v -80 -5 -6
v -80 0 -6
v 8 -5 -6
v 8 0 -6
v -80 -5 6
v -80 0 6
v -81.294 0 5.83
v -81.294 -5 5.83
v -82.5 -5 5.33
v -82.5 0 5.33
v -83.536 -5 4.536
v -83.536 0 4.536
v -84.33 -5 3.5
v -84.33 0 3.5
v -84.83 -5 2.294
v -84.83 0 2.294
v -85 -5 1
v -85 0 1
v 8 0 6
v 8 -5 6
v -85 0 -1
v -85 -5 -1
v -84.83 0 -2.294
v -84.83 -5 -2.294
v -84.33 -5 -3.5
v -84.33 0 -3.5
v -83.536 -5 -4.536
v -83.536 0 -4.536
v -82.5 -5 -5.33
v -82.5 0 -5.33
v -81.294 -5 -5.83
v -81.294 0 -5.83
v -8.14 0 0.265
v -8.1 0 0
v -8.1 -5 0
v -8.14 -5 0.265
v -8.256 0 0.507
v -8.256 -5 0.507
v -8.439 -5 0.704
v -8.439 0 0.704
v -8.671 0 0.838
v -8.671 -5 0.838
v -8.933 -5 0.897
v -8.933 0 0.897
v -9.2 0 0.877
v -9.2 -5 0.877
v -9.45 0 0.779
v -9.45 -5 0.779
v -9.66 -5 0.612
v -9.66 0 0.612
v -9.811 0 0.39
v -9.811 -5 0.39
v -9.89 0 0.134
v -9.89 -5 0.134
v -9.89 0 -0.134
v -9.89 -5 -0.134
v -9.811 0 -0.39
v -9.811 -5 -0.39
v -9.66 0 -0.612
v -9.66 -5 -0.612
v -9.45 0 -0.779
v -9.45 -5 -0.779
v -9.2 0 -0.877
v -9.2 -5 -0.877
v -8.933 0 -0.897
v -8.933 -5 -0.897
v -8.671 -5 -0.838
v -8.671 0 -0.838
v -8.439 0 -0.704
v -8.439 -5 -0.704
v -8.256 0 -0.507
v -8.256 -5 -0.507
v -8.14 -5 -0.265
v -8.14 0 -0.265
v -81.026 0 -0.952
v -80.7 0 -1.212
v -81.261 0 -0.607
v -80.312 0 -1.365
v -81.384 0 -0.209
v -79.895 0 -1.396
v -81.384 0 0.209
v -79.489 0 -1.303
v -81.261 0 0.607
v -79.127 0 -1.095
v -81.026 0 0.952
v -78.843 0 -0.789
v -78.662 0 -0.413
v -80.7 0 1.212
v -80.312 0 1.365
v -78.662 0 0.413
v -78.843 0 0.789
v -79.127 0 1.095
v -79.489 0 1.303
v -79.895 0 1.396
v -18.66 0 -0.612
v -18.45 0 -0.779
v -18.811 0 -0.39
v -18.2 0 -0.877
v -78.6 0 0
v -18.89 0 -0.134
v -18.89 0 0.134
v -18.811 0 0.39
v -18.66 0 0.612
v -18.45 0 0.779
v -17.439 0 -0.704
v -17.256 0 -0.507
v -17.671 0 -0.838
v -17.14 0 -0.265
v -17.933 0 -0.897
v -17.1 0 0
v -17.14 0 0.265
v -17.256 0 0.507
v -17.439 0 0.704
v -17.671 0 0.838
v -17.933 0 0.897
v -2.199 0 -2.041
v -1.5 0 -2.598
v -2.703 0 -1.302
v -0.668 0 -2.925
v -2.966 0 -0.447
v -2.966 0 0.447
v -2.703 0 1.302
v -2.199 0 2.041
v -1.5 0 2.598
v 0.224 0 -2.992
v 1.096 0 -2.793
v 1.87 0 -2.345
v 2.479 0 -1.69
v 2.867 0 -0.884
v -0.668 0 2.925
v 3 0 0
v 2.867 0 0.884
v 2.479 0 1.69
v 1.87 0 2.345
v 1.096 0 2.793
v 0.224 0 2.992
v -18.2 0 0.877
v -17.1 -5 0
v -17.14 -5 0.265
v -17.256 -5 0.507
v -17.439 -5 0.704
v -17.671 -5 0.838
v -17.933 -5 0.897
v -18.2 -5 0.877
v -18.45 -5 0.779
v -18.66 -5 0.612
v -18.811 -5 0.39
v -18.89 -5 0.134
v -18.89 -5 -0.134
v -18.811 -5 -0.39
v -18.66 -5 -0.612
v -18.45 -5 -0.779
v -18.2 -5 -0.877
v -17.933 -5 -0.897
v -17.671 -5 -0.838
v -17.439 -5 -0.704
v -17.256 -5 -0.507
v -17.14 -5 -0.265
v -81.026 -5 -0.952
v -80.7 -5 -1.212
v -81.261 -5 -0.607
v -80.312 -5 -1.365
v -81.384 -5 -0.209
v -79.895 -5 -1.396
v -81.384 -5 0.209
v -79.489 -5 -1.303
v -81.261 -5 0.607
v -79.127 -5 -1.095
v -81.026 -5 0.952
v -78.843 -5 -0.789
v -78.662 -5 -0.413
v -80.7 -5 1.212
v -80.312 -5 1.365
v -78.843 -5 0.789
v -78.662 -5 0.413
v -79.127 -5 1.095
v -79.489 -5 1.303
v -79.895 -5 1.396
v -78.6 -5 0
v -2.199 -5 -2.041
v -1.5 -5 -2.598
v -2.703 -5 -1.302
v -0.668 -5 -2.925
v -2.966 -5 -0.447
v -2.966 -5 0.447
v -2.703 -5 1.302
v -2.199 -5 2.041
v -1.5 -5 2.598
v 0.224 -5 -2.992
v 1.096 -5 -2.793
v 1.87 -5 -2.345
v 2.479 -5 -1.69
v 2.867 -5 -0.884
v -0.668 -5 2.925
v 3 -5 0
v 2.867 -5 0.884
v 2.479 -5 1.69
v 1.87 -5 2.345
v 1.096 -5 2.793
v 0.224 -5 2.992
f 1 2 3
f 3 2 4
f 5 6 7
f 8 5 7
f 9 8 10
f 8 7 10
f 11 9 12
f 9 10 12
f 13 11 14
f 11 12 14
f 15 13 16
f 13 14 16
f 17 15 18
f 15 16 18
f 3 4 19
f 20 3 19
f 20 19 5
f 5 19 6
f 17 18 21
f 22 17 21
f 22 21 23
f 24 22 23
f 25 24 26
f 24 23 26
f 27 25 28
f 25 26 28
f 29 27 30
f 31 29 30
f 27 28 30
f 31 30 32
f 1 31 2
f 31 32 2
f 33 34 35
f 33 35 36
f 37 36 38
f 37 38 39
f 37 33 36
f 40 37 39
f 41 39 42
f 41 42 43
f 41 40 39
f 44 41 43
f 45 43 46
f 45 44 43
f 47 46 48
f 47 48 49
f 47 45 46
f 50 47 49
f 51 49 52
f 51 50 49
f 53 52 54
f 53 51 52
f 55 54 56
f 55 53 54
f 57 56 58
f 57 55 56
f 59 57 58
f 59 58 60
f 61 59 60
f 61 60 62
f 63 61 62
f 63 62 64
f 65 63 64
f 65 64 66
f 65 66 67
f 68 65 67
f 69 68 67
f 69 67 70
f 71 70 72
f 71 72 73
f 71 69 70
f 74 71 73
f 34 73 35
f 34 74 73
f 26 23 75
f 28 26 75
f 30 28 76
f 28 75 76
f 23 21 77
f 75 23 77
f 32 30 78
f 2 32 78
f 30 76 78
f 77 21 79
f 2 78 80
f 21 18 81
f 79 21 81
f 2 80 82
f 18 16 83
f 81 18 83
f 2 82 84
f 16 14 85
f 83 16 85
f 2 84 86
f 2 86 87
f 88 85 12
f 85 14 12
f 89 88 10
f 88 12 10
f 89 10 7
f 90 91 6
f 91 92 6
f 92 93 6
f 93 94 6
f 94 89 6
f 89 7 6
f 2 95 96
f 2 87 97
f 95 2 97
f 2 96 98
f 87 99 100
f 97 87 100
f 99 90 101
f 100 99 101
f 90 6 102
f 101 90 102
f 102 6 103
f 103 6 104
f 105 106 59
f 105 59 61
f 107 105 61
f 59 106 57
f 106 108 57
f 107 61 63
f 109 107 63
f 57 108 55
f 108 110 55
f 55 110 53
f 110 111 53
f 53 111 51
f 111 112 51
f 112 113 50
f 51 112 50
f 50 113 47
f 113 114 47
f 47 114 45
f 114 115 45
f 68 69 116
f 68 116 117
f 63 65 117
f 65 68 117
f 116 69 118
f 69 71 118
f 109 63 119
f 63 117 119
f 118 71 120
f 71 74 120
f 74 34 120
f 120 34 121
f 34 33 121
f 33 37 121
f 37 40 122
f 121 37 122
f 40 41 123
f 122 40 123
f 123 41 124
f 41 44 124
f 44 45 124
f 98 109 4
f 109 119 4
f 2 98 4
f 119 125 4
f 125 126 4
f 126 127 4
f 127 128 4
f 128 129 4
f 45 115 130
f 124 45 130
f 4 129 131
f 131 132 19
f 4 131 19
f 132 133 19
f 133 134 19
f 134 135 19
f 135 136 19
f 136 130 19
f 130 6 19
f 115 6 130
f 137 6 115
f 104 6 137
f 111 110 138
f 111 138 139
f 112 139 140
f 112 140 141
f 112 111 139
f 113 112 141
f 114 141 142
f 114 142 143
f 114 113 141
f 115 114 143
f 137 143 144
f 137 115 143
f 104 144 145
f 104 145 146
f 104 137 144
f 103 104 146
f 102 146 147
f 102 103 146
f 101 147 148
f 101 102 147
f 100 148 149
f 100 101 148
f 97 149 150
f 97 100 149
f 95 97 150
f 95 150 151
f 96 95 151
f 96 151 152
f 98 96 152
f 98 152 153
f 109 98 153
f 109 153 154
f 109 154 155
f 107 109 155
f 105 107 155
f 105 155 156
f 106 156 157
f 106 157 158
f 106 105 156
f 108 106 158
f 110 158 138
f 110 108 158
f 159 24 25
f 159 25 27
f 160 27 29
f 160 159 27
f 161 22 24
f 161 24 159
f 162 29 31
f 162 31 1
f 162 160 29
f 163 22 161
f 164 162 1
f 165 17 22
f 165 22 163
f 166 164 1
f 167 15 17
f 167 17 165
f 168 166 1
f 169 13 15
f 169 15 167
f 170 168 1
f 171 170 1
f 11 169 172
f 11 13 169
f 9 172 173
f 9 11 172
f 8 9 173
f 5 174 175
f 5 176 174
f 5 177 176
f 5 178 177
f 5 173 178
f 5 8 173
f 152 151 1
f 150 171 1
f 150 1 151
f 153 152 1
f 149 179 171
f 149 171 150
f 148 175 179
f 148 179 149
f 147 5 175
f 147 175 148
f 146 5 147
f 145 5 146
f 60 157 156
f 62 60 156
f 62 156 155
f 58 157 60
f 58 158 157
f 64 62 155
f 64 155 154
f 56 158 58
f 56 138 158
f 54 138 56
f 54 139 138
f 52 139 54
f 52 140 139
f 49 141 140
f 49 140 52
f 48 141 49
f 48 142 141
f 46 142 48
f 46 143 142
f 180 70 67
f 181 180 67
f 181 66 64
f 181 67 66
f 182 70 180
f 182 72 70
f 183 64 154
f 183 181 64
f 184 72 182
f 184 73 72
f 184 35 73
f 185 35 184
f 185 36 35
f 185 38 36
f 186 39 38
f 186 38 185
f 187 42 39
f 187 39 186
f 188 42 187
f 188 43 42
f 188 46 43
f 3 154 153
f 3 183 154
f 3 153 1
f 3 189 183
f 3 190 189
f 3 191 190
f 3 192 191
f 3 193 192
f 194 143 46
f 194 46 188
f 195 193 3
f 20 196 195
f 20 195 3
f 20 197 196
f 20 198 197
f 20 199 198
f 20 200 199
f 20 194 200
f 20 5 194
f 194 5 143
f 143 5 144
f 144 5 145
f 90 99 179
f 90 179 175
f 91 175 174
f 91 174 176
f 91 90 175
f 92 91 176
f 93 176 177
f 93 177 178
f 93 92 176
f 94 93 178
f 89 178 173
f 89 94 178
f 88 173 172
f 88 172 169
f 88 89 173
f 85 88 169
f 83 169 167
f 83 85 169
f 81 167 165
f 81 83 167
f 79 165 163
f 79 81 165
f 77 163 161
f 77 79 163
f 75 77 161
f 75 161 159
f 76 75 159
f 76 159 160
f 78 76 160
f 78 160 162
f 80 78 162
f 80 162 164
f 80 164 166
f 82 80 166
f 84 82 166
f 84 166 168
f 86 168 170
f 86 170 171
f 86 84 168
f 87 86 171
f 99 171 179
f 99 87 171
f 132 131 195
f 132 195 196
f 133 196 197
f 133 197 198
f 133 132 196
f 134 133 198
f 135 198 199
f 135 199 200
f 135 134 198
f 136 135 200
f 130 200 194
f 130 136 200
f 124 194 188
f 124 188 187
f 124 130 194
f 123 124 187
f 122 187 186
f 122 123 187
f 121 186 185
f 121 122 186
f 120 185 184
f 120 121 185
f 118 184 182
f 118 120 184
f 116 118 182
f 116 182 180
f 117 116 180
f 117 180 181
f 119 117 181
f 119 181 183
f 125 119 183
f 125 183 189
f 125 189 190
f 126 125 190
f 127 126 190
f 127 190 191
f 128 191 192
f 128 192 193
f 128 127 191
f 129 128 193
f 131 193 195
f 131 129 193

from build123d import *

# Parameters (mm, degrees)
F0_R     = 1.4
F0_R_2   = 0.9
F0_R_3   = 3
F1_DEPTH = 5


with BuildPart() as f1:
    # F0 (on Front) → F1 (new body)
    with BuildSketch(Plane.XZ):
        with BuildLine():
            Line((-80, -6), (-11, -6))
            Line((-11, -6), (8, -6))
            Line((8, -6), (8, 6))
            Line((8, 6), (-11, 6))
            Line((-11, 6), (-80, 6))
            ThreePointArc((-80, 6), (-83.535534, 4.535534), (-85, 1))
            Line((-85, 1), (-85, -1))
            ThreePointArc((-85, -1), (-83.535534, -4.535534), (-80, -6))
        make_face()
        with Locations((-80, 0)):
            Circle(F0_R, mode=Mode.SUBTRACT)
        with Locations((-18, 0)):
            Circle(F0_R_2, mode=Mode.SUBTRACT)
        with Locations((-9, 0)):
            Circle(F0_R_2, mode=Mode.SUBTRACT)
        Circle(F0_R_3, mode=Mode.SUBTRACT)
    extrude(amount=F1_DEPTH)


solid = f1.part
